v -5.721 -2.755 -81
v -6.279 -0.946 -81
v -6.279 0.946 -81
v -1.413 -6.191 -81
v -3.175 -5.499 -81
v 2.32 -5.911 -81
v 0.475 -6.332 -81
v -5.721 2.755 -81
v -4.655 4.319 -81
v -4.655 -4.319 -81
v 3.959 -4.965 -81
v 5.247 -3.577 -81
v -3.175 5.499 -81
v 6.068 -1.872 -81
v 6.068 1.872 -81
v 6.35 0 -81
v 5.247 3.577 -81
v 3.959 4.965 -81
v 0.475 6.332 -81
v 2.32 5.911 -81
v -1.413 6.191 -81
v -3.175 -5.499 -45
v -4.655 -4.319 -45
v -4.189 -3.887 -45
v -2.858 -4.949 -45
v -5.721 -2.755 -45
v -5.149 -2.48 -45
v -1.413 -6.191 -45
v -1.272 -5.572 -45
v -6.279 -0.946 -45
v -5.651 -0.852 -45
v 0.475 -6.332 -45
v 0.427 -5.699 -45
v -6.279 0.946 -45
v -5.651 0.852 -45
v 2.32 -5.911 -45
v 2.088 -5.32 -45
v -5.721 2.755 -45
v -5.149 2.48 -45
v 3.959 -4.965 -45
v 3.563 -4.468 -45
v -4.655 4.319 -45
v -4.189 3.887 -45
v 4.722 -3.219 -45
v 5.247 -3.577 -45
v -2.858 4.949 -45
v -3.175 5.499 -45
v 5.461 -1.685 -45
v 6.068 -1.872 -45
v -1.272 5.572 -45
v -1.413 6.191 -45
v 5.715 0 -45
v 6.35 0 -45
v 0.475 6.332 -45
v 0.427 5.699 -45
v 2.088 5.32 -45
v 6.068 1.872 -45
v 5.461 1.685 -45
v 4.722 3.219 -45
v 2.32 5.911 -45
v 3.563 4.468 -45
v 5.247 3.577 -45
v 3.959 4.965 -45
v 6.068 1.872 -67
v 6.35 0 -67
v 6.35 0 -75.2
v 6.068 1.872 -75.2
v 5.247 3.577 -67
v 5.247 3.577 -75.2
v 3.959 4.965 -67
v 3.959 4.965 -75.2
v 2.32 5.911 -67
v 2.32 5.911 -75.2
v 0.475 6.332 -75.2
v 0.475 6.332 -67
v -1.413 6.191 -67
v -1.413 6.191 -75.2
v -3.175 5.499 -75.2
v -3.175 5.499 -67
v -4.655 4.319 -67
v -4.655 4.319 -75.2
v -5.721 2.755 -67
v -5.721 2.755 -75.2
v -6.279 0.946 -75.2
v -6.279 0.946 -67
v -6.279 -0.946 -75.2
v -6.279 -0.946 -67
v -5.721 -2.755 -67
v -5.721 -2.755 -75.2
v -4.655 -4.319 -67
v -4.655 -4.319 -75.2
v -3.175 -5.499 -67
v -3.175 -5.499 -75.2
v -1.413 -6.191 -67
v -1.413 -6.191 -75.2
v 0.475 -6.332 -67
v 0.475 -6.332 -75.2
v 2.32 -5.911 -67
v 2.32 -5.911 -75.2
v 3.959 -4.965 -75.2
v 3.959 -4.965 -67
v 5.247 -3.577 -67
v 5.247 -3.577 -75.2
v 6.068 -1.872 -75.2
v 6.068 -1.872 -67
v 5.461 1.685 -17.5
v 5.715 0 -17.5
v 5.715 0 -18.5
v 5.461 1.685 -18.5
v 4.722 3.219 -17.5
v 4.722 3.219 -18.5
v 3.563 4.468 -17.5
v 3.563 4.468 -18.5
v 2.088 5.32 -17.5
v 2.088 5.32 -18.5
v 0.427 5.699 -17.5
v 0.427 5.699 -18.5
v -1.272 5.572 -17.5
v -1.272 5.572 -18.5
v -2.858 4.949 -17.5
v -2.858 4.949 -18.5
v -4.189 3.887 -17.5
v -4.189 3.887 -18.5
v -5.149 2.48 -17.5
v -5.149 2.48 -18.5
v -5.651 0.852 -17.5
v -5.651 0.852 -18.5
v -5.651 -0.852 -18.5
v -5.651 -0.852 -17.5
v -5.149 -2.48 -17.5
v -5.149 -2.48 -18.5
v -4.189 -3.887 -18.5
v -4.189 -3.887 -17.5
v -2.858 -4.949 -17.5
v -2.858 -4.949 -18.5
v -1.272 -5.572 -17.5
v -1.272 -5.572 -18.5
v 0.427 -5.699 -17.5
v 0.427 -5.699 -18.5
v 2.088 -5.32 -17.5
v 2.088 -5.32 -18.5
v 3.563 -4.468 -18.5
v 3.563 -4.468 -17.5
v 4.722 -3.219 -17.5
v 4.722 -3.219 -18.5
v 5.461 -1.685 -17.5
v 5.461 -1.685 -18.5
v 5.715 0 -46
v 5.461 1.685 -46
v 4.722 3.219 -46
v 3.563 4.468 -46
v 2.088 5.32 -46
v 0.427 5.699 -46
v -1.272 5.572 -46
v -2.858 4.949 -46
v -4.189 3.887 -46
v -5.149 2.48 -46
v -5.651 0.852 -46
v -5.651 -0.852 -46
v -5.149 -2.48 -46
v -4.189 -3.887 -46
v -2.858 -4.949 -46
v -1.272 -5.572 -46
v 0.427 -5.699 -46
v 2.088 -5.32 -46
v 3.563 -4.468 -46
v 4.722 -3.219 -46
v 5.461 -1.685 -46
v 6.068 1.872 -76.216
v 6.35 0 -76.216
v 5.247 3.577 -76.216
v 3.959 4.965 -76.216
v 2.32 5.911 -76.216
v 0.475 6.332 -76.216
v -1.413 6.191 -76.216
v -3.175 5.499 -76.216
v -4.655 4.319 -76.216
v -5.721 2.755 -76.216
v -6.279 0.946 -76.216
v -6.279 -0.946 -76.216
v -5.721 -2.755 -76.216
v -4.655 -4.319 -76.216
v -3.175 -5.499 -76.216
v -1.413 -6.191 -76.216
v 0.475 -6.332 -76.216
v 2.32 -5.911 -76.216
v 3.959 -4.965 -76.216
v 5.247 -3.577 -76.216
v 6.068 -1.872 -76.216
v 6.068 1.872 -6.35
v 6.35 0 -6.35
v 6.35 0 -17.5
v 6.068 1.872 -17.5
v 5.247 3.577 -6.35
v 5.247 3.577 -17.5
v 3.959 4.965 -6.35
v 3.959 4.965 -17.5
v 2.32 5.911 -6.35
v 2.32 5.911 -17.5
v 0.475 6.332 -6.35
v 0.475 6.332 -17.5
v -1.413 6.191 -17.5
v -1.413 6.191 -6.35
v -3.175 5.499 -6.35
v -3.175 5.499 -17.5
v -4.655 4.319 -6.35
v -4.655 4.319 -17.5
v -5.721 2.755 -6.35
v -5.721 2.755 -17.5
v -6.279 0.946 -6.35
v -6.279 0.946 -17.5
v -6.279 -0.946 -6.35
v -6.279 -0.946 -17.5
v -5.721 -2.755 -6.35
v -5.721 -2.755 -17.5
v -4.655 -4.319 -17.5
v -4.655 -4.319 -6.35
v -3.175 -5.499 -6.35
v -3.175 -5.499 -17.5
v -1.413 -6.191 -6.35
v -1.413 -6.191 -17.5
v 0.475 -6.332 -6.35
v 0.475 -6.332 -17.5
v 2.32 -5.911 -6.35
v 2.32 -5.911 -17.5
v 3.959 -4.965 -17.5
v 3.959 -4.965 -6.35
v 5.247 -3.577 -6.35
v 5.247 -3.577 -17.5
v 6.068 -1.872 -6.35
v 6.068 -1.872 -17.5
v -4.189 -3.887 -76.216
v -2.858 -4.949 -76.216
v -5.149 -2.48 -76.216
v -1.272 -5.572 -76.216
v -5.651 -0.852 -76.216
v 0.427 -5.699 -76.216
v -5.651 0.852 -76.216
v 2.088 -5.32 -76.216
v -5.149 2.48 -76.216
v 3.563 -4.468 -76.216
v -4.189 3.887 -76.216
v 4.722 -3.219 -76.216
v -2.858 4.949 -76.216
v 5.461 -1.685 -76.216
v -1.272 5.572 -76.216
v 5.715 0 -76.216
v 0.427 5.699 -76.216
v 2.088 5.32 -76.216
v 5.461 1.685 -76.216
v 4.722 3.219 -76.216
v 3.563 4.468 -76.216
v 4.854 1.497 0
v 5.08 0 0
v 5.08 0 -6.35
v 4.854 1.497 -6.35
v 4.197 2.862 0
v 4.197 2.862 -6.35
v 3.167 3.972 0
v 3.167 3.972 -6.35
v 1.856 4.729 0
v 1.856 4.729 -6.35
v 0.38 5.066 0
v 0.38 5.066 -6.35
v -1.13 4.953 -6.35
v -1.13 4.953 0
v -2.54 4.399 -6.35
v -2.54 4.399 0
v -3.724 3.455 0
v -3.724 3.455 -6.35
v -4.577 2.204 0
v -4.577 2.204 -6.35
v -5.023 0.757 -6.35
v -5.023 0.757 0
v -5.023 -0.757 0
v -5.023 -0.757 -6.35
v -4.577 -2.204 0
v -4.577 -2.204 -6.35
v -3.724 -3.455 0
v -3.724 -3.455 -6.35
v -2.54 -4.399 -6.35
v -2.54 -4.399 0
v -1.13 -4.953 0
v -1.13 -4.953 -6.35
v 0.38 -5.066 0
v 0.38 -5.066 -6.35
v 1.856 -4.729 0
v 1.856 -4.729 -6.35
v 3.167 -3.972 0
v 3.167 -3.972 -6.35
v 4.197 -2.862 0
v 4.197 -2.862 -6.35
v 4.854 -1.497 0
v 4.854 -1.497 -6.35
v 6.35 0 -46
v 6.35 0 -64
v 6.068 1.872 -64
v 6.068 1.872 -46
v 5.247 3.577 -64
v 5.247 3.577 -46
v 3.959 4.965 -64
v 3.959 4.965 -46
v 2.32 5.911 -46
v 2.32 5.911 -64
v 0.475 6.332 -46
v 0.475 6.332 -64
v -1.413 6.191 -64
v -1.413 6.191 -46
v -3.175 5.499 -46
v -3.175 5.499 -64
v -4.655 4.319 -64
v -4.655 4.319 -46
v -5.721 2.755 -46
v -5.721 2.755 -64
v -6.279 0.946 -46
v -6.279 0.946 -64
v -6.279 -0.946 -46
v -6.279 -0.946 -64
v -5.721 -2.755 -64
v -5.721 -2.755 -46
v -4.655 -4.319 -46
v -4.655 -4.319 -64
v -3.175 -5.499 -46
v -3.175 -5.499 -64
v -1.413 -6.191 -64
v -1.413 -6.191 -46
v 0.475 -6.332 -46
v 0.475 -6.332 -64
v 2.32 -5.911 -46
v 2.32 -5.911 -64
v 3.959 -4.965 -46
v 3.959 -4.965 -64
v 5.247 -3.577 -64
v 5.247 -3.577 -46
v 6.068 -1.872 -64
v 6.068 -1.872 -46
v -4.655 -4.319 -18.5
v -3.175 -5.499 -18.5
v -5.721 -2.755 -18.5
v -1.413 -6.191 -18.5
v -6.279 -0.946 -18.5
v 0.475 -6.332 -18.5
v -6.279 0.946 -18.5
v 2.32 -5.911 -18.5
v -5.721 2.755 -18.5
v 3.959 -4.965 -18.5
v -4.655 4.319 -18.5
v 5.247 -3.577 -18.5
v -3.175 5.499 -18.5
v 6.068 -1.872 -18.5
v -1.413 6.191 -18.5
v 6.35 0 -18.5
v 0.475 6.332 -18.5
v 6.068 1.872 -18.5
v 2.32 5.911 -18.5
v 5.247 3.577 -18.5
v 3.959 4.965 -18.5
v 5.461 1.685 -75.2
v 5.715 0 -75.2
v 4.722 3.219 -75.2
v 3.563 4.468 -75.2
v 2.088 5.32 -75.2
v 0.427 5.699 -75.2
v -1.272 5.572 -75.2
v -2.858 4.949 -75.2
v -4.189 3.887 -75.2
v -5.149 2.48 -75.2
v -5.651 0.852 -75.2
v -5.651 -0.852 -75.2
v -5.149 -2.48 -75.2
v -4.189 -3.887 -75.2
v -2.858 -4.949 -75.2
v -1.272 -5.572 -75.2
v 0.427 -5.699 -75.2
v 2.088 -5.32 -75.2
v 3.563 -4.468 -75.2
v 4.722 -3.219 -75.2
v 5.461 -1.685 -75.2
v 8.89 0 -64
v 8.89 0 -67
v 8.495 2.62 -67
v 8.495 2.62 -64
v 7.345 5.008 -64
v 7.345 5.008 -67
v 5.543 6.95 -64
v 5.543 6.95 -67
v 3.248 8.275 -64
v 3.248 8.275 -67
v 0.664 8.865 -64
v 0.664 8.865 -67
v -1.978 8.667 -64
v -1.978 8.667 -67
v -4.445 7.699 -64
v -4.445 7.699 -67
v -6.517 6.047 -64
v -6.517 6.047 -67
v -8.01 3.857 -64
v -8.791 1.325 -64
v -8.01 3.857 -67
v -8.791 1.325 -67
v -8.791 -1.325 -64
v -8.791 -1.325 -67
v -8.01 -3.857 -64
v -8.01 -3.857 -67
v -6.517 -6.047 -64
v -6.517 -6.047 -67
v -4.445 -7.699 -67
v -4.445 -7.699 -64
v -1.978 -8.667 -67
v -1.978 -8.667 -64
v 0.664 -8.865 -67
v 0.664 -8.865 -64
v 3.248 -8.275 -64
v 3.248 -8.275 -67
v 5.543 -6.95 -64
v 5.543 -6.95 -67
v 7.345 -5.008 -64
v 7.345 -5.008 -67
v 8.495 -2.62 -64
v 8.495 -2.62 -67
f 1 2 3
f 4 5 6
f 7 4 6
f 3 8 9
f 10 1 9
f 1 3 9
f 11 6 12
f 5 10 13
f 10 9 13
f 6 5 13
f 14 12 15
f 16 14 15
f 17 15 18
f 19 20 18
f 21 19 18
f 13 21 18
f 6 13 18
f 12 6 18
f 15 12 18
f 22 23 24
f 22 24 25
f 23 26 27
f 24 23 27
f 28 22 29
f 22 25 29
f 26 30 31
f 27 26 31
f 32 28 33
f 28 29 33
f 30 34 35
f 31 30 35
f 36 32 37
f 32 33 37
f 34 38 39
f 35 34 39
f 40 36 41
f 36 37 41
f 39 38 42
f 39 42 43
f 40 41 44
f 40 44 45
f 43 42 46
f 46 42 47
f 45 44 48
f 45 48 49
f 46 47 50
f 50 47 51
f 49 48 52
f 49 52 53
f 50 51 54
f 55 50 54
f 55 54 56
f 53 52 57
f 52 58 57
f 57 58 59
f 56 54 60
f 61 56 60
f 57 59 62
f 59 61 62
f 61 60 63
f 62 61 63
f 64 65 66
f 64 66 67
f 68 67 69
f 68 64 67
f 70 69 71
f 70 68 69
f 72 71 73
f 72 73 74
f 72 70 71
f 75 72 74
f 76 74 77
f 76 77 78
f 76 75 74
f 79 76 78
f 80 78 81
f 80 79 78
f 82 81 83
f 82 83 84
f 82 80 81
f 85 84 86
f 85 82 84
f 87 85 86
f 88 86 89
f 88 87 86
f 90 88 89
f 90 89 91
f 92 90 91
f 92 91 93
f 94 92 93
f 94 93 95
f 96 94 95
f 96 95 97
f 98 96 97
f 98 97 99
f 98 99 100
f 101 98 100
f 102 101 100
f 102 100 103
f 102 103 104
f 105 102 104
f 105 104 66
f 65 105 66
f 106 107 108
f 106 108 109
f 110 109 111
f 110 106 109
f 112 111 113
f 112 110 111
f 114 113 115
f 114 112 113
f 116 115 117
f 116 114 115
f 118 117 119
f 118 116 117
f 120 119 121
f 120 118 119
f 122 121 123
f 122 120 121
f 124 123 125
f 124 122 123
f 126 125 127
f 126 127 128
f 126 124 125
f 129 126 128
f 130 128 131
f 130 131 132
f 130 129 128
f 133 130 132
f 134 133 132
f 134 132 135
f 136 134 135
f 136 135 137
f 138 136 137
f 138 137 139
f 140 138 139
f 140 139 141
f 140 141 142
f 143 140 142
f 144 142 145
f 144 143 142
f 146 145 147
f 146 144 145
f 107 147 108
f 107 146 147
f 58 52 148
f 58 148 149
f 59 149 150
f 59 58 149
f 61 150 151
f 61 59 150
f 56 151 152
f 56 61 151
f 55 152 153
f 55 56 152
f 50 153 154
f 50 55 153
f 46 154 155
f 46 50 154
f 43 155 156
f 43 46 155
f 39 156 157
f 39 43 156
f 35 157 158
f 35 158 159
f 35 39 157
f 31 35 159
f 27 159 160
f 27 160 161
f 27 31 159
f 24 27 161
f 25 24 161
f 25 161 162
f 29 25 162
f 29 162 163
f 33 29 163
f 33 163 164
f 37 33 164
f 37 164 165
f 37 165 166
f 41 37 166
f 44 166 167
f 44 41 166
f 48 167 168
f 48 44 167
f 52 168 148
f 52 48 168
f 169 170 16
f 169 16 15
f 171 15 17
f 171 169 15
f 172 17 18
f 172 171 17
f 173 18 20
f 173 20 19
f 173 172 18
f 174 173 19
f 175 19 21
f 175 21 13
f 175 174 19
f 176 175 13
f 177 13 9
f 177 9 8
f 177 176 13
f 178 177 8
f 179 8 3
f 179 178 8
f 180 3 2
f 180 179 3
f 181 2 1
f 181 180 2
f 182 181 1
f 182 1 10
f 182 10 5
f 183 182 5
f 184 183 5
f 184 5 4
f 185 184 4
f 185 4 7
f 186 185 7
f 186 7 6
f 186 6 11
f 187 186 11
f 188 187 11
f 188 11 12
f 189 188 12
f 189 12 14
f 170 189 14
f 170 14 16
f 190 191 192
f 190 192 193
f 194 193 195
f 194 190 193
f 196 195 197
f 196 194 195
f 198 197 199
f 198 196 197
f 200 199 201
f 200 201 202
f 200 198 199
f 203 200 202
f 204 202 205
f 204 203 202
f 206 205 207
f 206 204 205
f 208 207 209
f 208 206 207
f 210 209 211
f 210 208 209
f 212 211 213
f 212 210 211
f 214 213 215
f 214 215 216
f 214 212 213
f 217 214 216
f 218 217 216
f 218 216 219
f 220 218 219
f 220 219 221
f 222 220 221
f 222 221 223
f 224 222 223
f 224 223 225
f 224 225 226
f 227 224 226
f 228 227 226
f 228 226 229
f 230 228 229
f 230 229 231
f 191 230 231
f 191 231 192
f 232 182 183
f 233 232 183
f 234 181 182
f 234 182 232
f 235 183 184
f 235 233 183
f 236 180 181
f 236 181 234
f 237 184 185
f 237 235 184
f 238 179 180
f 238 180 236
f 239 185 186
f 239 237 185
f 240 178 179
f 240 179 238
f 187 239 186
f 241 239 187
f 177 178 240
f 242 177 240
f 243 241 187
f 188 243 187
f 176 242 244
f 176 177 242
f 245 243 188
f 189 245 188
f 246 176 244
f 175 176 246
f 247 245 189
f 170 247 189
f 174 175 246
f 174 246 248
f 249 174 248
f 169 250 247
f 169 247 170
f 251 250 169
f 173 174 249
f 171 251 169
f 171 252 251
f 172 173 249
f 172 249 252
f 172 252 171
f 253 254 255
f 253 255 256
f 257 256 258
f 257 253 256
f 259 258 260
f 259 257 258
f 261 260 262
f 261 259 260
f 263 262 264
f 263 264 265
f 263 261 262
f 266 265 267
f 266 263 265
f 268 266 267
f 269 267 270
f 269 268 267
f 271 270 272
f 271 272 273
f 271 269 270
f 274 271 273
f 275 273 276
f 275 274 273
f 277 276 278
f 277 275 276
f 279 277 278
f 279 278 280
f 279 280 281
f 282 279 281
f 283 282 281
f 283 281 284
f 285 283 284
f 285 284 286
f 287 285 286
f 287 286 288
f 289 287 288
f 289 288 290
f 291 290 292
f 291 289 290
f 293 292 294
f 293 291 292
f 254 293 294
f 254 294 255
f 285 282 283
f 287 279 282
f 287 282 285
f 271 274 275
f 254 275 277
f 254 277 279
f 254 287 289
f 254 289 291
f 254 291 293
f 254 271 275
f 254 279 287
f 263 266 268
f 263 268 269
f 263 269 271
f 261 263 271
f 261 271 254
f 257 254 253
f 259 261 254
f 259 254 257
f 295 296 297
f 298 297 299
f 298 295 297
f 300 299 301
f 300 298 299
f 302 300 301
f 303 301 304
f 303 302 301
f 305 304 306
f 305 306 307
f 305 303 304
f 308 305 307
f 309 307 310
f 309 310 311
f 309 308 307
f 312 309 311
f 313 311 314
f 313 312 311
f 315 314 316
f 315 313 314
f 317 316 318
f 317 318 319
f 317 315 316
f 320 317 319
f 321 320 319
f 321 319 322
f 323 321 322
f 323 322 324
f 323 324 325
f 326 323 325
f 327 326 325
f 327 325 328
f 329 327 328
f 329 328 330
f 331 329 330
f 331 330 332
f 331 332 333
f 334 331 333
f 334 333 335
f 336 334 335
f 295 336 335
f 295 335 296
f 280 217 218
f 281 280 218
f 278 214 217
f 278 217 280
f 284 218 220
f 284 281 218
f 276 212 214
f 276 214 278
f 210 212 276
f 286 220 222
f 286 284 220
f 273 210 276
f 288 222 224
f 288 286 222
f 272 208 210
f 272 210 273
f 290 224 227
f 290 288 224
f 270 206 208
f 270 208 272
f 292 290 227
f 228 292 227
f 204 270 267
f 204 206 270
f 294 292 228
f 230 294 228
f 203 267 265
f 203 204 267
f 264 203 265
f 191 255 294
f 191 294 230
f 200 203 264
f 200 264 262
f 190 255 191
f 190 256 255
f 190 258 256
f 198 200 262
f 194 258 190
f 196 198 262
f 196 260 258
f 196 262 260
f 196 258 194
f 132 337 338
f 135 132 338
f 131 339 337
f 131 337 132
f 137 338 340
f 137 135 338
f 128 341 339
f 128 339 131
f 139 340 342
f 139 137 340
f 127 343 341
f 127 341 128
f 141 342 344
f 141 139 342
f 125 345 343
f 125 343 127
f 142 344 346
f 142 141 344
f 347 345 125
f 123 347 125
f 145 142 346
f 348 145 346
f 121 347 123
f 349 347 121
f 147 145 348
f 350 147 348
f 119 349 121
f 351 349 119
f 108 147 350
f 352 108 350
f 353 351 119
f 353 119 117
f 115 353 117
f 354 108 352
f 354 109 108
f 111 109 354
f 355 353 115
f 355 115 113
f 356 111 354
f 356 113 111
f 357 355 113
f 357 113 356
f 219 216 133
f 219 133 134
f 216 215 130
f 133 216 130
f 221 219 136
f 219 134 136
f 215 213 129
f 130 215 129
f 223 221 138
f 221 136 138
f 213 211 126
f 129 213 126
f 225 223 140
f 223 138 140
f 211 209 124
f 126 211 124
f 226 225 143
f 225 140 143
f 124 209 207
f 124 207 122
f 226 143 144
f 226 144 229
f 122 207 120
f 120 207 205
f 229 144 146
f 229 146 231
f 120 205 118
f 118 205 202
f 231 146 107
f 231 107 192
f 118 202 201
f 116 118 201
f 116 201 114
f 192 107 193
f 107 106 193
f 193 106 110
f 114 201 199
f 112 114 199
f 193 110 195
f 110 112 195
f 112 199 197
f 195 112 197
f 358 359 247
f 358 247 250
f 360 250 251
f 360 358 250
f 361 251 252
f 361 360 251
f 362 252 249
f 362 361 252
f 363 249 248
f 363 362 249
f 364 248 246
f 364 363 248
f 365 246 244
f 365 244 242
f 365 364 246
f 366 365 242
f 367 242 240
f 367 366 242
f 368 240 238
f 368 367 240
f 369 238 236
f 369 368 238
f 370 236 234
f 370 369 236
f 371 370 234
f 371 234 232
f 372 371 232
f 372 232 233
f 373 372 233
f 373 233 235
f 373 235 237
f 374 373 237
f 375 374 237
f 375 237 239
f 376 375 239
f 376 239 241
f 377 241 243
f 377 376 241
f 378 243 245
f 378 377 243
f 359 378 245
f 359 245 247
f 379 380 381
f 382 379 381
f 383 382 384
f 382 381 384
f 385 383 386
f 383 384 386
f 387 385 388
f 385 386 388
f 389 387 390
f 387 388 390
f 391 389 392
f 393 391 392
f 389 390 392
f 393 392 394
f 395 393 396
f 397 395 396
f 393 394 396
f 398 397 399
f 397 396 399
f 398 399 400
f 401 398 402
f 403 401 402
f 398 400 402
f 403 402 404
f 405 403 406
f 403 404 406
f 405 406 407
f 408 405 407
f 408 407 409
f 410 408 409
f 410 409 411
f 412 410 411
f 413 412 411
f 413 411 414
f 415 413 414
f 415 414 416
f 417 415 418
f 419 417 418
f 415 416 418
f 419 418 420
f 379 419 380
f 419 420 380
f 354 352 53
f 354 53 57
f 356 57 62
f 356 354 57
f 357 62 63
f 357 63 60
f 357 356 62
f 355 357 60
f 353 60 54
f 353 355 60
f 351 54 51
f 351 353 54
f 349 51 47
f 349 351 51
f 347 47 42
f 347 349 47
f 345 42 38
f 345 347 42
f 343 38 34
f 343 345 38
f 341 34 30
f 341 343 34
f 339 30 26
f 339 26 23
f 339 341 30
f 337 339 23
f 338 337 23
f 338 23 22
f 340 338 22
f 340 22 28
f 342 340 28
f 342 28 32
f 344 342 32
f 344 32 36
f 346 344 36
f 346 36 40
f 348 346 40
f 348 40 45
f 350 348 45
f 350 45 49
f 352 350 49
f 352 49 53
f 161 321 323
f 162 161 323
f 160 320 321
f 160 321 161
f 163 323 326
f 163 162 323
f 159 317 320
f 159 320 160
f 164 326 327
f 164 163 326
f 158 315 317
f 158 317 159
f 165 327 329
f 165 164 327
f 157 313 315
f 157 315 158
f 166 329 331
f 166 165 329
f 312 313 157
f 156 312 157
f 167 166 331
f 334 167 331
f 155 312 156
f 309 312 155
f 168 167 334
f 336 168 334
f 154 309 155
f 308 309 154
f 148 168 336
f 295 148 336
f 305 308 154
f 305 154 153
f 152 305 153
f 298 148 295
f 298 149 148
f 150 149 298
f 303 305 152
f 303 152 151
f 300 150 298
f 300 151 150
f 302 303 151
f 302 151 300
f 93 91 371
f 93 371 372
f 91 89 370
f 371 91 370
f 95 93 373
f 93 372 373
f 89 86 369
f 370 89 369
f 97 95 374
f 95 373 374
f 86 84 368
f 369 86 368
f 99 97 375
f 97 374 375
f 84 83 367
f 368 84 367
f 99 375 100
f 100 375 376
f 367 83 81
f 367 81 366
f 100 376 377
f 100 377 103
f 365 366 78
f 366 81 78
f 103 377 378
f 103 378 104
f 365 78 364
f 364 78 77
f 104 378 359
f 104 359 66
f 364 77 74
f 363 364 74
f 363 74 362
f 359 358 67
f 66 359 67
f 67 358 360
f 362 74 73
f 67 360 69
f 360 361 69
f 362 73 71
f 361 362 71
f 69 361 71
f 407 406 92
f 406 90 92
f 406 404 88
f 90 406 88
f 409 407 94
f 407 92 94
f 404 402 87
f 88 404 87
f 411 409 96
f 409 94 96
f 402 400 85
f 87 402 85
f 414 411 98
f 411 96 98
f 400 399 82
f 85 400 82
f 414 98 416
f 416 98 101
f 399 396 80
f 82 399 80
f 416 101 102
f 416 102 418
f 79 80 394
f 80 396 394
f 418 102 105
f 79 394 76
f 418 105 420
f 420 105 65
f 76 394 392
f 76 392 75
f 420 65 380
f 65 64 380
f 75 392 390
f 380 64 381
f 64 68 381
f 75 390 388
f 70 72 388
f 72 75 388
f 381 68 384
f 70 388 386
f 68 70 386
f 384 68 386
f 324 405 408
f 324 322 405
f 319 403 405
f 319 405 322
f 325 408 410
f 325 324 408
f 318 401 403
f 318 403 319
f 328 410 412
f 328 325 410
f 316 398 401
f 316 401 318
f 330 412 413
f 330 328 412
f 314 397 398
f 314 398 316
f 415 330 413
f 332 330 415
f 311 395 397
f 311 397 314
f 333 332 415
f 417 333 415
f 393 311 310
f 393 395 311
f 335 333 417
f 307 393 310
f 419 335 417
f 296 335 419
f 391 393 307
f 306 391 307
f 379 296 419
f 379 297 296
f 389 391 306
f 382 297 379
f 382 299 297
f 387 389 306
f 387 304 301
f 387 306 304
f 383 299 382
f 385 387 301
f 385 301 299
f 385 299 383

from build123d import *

# Parameters (mm, degrees)
SKETCH1_R           = 6.35
BOSS_EXTRUDE1_DEPTH = 81
CUT_EXTRUDE1_START  = -75.2
SKETCH2_R           = 12.7
SKETCH2_R_2         = 5.715
CUT_EXTRUDE1_DEPTH  = 1.016
BOSS_EXTRUDE2_START = -67
SKETCH3_R           = 8.89
BOSS_EXTRUDE2_DEPTH = 3
SKETCH4_R           = 7.62
SKETCH4_R_2         = 5.08
CUT_EXTRUDE2_DEPTH  = 6.35
CUT_EXTRUDE4_START  = -17.5
SKETCH5_R           = 12.7
SKETCH5_R_2         = 5.715
CUT_EXTRUDE4_DEPTH  = 1
CUT_EXTRUDE5_START  = -45
SKETCH6_R           = 12.7
SKETCH6_R_2         = 5.715
CUT_EXTRUDE5_DEPTH  = 1


with BuildPart() as part:
    # Sketch1 → Boss-Extrude1 (new body)
    with BuildSketch(Plane.XY):
        Circle(SKETCH1_R)
    extrude(amount=-BOSS_EXTRUDE1_DEPTH)

    # Sketch2 → Cut-Extrude1 (cut)
    with BuildSketch(Plane.XY.offset(CUT_EXTRUDE1_START)):
        with Locations((0.049037486, 0)):
            Circle(SKETCH2_R)
        Circle(SKETCH2_R_2, mode=Mode.SUBTRACT)
    extrude(amount=-CUT_EXTRUDE1_DEPTH, mode=Mode.SUBTRACT)

    # Sketch3 → Boss-Extrude2 (add)
    with BuildSketch(Plane.XY.offset(BOSS_EXTRUDE2_START)):
        Circle(SKETCH3_R)
    extrude(amount=BOSS_EXTRUDE2_DEPTH)

    # Sketch4 → Cut-Extrude2 (cut)
    with BuildSketch(Plane.XY):
        Circle(SKETCH4_R)
        Circle(SKETCH4_R_2, mode=Mode.SUBTRACT)
    extrude(amount=-CUT_EXTRUDE2_DEPTH, mode=Mode.SUBTRACT)

    # Sketch5 → Cut-Extrude4 (cut)
    with BuildSketch(Plane.XY.offset(CUT_EXTRUDE4_START)):
        Circle(SKETCH5_R)
        Circle(SKETCH5_R_2, mode=Mode.SUBTRACT)
    extrude(amount=-CUT_EXTRUDE4_DEPTH, mode=Mode.SUBTRACT)

    # Sketch6 → Cut-Extrude5 (cut)
    with BuildSketch(Plane.XY.offset(CUT_EXTRUDE5_START)):
        Circle(SKETCH6_R)
        Circle(SKETCH6_R_2, mode=Mode.SUBTRACT)
    extrude(amount=-CUT_EXTRUDE5_DEPTH, mode=Mode.SUBTRACT)


solid = part.part
